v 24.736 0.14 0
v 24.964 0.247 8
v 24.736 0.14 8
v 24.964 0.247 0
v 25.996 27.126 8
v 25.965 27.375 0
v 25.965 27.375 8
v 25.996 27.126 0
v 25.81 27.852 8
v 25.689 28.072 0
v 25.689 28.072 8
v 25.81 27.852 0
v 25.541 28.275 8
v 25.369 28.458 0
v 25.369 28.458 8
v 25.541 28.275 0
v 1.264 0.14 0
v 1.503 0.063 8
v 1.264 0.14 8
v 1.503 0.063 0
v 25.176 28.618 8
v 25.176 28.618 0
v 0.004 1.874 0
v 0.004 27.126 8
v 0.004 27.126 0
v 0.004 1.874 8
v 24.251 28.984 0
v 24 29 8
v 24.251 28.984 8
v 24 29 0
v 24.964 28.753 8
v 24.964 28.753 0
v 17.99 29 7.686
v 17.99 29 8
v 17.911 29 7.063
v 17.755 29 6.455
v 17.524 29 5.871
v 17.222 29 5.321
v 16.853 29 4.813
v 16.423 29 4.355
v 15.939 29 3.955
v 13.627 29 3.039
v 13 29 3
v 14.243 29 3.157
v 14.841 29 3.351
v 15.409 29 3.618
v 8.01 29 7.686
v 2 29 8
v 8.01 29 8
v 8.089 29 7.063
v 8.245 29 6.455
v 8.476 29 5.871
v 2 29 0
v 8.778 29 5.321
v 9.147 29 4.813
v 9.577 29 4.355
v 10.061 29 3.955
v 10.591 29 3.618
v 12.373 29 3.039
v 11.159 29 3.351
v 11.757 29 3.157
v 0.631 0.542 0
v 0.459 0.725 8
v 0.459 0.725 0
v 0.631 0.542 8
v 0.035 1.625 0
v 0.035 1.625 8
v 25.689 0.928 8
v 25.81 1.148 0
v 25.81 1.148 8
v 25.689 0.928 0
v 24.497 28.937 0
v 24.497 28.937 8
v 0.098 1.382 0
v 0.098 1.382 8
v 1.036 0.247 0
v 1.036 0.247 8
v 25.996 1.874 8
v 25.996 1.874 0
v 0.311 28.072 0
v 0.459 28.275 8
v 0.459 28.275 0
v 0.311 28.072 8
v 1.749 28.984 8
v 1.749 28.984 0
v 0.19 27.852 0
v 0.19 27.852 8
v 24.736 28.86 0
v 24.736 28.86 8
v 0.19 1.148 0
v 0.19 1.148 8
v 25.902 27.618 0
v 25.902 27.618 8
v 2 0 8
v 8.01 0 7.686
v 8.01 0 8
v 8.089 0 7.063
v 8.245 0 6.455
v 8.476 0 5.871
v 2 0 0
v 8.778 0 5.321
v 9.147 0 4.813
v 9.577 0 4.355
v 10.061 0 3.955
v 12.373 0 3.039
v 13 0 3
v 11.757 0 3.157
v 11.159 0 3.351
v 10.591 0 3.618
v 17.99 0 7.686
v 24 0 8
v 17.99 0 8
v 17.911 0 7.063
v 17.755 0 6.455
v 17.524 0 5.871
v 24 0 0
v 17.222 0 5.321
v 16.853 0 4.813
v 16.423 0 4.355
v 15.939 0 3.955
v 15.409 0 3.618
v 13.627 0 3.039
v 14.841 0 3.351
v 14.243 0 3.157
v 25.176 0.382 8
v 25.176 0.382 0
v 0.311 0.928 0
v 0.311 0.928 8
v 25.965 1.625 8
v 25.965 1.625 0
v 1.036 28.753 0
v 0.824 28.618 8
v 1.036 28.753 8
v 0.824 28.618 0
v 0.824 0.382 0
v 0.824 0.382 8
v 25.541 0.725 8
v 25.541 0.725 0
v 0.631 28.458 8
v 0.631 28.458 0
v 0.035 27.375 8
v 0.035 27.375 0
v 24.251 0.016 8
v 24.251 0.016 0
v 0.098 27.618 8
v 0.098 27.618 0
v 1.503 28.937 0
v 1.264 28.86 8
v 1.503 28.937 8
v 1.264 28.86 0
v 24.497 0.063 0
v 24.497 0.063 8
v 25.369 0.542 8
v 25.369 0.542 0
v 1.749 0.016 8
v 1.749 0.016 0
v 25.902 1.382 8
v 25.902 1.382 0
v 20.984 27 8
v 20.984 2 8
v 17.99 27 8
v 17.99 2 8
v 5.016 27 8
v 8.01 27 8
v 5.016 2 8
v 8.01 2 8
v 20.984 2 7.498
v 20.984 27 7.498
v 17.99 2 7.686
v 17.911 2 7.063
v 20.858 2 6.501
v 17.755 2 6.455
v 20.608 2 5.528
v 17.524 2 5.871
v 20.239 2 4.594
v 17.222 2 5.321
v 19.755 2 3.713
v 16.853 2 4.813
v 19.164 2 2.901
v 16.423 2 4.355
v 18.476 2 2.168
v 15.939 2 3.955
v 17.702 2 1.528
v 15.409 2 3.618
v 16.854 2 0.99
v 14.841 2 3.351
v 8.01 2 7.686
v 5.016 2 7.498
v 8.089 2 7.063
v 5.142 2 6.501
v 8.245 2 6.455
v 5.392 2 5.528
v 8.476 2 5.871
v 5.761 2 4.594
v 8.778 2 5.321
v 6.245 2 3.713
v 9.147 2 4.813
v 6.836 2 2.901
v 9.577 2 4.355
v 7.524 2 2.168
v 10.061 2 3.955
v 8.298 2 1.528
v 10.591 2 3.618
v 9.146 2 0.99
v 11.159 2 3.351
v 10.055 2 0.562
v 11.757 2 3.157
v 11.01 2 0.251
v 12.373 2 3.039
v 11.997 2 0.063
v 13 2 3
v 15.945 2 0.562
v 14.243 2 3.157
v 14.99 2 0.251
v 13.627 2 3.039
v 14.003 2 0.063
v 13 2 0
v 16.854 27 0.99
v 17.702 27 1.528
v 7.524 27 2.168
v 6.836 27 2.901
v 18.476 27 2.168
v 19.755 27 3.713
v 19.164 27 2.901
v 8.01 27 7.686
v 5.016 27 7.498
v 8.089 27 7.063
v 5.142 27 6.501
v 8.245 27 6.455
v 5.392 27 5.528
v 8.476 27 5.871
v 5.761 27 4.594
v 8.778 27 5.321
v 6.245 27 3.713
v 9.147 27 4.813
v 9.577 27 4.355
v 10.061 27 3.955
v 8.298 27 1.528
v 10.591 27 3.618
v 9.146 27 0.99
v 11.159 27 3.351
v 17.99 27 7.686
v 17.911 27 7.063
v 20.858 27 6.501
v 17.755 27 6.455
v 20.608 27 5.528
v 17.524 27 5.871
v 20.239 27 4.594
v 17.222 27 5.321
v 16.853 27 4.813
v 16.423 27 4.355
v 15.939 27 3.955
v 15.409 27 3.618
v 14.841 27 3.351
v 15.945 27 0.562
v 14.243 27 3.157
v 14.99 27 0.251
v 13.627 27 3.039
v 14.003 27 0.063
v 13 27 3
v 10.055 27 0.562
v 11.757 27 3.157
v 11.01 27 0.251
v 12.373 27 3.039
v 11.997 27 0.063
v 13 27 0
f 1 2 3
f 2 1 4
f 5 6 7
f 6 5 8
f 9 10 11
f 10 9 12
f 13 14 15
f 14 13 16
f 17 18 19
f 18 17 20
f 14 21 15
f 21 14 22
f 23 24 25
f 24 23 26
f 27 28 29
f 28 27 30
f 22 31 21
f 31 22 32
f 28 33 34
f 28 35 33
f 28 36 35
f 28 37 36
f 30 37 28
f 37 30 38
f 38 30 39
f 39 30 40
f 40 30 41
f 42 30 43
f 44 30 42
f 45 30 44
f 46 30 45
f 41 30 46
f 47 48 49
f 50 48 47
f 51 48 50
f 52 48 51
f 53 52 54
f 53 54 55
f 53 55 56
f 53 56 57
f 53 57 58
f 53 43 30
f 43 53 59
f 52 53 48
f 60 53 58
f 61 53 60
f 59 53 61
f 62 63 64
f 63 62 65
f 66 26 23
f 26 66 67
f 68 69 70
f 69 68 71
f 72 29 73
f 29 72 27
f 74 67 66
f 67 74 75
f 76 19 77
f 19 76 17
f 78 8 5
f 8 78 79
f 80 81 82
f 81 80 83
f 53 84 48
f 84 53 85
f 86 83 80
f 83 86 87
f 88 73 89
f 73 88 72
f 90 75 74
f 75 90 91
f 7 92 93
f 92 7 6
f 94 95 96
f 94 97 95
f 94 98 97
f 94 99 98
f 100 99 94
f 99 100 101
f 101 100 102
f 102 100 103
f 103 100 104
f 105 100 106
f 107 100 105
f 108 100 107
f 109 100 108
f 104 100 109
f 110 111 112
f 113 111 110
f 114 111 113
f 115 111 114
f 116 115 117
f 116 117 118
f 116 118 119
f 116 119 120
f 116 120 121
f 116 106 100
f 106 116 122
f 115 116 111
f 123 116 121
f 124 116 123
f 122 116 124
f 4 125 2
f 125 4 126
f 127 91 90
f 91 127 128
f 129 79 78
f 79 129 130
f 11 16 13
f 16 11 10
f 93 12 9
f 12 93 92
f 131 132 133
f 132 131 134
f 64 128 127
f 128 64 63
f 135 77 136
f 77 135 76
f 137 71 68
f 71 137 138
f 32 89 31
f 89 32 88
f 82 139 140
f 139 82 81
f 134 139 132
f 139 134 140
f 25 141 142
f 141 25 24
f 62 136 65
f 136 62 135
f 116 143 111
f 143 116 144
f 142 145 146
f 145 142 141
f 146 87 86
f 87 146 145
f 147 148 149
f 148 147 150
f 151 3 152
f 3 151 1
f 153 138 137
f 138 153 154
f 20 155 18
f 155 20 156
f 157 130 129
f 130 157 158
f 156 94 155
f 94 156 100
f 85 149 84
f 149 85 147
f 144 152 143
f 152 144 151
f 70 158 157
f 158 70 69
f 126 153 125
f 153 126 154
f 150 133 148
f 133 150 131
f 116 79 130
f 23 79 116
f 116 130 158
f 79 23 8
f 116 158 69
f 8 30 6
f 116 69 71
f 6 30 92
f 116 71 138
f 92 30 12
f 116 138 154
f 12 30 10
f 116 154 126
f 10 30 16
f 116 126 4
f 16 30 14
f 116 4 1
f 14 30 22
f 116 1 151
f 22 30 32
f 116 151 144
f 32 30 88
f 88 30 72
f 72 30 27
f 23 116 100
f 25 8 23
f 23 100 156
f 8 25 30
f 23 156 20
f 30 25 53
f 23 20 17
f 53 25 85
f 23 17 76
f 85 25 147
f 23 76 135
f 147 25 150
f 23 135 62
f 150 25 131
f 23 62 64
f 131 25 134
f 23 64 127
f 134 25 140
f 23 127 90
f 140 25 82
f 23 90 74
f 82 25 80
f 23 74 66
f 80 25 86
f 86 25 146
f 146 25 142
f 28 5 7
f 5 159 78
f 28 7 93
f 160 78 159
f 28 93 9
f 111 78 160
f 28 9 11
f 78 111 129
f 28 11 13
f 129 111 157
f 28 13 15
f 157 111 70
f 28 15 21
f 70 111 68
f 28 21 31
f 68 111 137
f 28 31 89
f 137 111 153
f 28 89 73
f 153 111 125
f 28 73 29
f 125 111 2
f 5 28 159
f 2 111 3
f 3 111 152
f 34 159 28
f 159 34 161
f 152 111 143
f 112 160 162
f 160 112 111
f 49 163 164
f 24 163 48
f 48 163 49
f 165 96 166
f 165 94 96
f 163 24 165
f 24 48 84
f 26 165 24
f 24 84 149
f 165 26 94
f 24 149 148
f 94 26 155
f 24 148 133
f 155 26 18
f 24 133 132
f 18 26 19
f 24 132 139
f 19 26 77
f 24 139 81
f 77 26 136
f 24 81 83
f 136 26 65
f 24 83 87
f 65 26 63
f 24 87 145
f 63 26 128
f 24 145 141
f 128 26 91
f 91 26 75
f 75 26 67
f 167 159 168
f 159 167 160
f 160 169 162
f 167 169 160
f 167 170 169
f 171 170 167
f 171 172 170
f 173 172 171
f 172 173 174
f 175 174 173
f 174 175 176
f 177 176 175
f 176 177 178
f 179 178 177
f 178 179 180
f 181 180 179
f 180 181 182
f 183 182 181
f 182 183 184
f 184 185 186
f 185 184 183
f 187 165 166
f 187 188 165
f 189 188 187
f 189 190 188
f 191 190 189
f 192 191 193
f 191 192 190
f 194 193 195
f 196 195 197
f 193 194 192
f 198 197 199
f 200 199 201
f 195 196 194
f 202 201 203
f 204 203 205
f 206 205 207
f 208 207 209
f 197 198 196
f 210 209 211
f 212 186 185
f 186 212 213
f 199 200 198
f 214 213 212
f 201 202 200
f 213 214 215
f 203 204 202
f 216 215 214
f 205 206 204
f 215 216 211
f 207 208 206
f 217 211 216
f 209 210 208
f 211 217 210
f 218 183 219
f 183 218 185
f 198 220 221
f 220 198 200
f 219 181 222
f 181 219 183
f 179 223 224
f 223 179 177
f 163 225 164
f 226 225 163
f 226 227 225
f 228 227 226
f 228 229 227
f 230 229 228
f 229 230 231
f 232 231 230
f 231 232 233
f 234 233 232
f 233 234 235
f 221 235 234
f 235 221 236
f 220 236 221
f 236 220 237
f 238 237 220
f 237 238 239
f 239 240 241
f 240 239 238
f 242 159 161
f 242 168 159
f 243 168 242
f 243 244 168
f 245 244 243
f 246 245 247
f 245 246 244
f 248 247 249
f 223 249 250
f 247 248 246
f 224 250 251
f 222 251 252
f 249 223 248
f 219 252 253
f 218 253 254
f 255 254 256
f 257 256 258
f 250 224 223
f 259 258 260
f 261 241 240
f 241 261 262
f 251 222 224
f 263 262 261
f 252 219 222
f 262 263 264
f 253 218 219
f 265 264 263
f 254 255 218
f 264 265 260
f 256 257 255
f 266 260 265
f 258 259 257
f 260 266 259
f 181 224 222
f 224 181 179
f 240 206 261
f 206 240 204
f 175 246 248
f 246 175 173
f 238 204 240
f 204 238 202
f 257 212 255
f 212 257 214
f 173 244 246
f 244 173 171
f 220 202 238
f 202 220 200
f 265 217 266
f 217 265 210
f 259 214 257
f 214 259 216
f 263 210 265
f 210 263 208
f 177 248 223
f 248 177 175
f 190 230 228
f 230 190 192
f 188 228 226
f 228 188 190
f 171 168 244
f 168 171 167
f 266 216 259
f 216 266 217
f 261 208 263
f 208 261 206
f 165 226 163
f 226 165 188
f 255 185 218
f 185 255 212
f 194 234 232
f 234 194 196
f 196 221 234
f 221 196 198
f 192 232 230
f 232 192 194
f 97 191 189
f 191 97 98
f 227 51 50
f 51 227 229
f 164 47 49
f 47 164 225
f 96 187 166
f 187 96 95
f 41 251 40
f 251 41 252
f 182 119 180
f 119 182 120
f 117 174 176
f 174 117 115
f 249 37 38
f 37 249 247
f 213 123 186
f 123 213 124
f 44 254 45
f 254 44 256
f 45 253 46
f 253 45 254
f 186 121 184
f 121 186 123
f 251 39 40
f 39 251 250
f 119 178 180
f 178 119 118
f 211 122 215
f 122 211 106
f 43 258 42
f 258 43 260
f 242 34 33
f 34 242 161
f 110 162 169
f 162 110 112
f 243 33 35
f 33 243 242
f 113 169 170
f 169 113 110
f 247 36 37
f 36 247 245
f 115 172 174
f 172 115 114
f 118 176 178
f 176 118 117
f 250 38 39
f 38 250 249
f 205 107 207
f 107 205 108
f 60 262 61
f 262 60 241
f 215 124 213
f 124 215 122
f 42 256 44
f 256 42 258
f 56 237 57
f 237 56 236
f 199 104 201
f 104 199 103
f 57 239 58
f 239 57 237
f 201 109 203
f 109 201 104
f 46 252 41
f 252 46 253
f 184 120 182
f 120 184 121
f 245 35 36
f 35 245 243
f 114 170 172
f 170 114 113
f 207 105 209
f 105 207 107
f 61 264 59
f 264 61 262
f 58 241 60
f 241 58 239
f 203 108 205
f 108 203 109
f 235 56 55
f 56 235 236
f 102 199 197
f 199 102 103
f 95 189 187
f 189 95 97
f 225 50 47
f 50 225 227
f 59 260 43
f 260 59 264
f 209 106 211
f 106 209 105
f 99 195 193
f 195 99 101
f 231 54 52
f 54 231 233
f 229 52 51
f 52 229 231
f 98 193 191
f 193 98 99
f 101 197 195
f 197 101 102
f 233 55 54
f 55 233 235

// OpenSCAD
//Klammer - Variablen
//wandstaerke=2;
//d_bushing=12;
//d_bushing_corr =0.5; // Korrektur für die lockere Öffnung;
//h_bushing=15;

//Klammer (unrotiert)
module LMEBUU_holder_u(thickness_w,thickness_l,diameter,length,rod_diameter, base_height) {
        outer_length = length+2*thickness_l;
        opening = 180;
        difference(){
            //Basis
            b_width = diameter+2*thickness_w;
            b_length = outer_length;
            b_height = diameter/2+base_height;
            
            minik_r = 2;
            minik_h = 1;
            translate([-b_height,-b_width/2+minik_r,minik_r]){
                minkowski(){
                    cube([b_height-minik_h, b_width-2*minik_r, b_length-2*minik_r]);
                    rotate([0,90,0]){
                        cylinder(r=minik_r,h=minik_h); //Wird durch Zylinder gr_z+1 dick!
                    }
                }
                
                
            } 
      
            //Loch LMEBUU
            translate([0,0,thickness_l]){
                cylinder(d1=diameter,d2=diameter,h=length);
            }
            
            //Loch Stange
            translate([0,0,0]){
                cylinder(d1=rod_diameter,d2=rod_diameter,h=outer_length);
            }
        }
}

module LMEBUU_holder(thickness_w,thickness_l,diameter,length,rod_diameter, base_height, center){
    if(center== true) {
        translate([0,-length/2-thickness_l,base_height+diameter/2]){ rotate([0,-90,-90]) {
            LMEBUU_holder_u(thickness_w,thickness_l, diameter, length,rod_diameter, base_height);
        }}
    } 
    else {
        translate([diameter/2+thickness_w,0,base_height+diameter/2]){ rotate([0,-90,-90]) {
            LMEBUU_holder_u(thickness_w,thickness_l, diameter, length,rod_diameter, base_height);
        }}
    }
}

//Aussparung (unrotiert)
module LMEBUU_holder_cts_u(thickness_w,thickness_l, diameter, length, ct, amount = 2){
    // Aussparung
    a_length = 180;
    a_width = ct[1];
    a_depth = ct[0];
    
    step = [0, 0.5, 0.25];
    steps = [[], [1], [1,3]];
    for(i = steps[amount]){
       translate([0,0,-a_width/2 + i*step[amount]*(length+2*thickness_l)]){
        rotate([0,0,90]) {
            rotate_extrude(angle = 180){
                translate([diameter/2+thickness_l, 0]){
                    square([a_depth,a_width]);
                }
            }
        }
    }    
    }
}

//Aussparung 
module LMEBUU_holder_cts(thickness_w,thickness_l, diameter, length, base_height,ct, amount, center=false){
    if(center == true) {
        translate([0,-length/2-thickness_l,base_height+diameter/2]){ rotate([0,-90,-90]) {
            LMEBUU_holder_cts_u(thickness_w,thickness_l,diameter,length, ct, amount);
        }}
    } 
    else {
        translate([diameter/2+thickness_w,0,base_height+diameter/2]){ rotate([0,-90,-90]) {
            LMEBUU_holder_cts_u(thickness_w,thickness_l,diameter,length, ct, amount);
        }}
    }
}

//Klammer mit Kabelbinder-Aussparung (unrotiert)
module LMEBUU_holder_with_cts_u(thickness_w,thickness_l,diameter,length,rod_diameter, base_height,ct, amount_cts) {
    difference(){
        LMEBUU_holder_u(thickness_w,thickness_l,diameter,length,rod_diameter, base_height);
        LMEBUU_holder_cts_u(thickness_w,thickness_l, diameter, length, ct, amount_cts);
    }
}



module LMEBUU_holder_with_cts(thickness_w,thickness_l,diameter,length,rod_diameter,base_height,ct,amount_cts, center=false){
    if(center == true) {
        translate([0,-length/2-thickness_l,base_height+diameter/2]){ rotate([0,-90,-90]) {
            LMEBUU_holder_with_cts_u(thickness_w,thickness_l,diameter,length,rod_diameter, base_height, ct, amount_cts);
        }}
    } 
    else {
        translate([diameter/2+thickness_w,0,base_height+diameter/2]){ rotate([0,-90,-90]) {
            LMEBUU_holder_with_cts_u(thickness_w,thickness_l,diameter,length,rod_diameter, base_height, ct, amount_cts);
        }}
    }
}
$fn=50;
LMEBUU_holder_with_cts(5,2,16,25,10,0,[1.5,3.5],0, center=false);
//aussparungen(5, 2,16,25,5, [1.5,2], center=false);
